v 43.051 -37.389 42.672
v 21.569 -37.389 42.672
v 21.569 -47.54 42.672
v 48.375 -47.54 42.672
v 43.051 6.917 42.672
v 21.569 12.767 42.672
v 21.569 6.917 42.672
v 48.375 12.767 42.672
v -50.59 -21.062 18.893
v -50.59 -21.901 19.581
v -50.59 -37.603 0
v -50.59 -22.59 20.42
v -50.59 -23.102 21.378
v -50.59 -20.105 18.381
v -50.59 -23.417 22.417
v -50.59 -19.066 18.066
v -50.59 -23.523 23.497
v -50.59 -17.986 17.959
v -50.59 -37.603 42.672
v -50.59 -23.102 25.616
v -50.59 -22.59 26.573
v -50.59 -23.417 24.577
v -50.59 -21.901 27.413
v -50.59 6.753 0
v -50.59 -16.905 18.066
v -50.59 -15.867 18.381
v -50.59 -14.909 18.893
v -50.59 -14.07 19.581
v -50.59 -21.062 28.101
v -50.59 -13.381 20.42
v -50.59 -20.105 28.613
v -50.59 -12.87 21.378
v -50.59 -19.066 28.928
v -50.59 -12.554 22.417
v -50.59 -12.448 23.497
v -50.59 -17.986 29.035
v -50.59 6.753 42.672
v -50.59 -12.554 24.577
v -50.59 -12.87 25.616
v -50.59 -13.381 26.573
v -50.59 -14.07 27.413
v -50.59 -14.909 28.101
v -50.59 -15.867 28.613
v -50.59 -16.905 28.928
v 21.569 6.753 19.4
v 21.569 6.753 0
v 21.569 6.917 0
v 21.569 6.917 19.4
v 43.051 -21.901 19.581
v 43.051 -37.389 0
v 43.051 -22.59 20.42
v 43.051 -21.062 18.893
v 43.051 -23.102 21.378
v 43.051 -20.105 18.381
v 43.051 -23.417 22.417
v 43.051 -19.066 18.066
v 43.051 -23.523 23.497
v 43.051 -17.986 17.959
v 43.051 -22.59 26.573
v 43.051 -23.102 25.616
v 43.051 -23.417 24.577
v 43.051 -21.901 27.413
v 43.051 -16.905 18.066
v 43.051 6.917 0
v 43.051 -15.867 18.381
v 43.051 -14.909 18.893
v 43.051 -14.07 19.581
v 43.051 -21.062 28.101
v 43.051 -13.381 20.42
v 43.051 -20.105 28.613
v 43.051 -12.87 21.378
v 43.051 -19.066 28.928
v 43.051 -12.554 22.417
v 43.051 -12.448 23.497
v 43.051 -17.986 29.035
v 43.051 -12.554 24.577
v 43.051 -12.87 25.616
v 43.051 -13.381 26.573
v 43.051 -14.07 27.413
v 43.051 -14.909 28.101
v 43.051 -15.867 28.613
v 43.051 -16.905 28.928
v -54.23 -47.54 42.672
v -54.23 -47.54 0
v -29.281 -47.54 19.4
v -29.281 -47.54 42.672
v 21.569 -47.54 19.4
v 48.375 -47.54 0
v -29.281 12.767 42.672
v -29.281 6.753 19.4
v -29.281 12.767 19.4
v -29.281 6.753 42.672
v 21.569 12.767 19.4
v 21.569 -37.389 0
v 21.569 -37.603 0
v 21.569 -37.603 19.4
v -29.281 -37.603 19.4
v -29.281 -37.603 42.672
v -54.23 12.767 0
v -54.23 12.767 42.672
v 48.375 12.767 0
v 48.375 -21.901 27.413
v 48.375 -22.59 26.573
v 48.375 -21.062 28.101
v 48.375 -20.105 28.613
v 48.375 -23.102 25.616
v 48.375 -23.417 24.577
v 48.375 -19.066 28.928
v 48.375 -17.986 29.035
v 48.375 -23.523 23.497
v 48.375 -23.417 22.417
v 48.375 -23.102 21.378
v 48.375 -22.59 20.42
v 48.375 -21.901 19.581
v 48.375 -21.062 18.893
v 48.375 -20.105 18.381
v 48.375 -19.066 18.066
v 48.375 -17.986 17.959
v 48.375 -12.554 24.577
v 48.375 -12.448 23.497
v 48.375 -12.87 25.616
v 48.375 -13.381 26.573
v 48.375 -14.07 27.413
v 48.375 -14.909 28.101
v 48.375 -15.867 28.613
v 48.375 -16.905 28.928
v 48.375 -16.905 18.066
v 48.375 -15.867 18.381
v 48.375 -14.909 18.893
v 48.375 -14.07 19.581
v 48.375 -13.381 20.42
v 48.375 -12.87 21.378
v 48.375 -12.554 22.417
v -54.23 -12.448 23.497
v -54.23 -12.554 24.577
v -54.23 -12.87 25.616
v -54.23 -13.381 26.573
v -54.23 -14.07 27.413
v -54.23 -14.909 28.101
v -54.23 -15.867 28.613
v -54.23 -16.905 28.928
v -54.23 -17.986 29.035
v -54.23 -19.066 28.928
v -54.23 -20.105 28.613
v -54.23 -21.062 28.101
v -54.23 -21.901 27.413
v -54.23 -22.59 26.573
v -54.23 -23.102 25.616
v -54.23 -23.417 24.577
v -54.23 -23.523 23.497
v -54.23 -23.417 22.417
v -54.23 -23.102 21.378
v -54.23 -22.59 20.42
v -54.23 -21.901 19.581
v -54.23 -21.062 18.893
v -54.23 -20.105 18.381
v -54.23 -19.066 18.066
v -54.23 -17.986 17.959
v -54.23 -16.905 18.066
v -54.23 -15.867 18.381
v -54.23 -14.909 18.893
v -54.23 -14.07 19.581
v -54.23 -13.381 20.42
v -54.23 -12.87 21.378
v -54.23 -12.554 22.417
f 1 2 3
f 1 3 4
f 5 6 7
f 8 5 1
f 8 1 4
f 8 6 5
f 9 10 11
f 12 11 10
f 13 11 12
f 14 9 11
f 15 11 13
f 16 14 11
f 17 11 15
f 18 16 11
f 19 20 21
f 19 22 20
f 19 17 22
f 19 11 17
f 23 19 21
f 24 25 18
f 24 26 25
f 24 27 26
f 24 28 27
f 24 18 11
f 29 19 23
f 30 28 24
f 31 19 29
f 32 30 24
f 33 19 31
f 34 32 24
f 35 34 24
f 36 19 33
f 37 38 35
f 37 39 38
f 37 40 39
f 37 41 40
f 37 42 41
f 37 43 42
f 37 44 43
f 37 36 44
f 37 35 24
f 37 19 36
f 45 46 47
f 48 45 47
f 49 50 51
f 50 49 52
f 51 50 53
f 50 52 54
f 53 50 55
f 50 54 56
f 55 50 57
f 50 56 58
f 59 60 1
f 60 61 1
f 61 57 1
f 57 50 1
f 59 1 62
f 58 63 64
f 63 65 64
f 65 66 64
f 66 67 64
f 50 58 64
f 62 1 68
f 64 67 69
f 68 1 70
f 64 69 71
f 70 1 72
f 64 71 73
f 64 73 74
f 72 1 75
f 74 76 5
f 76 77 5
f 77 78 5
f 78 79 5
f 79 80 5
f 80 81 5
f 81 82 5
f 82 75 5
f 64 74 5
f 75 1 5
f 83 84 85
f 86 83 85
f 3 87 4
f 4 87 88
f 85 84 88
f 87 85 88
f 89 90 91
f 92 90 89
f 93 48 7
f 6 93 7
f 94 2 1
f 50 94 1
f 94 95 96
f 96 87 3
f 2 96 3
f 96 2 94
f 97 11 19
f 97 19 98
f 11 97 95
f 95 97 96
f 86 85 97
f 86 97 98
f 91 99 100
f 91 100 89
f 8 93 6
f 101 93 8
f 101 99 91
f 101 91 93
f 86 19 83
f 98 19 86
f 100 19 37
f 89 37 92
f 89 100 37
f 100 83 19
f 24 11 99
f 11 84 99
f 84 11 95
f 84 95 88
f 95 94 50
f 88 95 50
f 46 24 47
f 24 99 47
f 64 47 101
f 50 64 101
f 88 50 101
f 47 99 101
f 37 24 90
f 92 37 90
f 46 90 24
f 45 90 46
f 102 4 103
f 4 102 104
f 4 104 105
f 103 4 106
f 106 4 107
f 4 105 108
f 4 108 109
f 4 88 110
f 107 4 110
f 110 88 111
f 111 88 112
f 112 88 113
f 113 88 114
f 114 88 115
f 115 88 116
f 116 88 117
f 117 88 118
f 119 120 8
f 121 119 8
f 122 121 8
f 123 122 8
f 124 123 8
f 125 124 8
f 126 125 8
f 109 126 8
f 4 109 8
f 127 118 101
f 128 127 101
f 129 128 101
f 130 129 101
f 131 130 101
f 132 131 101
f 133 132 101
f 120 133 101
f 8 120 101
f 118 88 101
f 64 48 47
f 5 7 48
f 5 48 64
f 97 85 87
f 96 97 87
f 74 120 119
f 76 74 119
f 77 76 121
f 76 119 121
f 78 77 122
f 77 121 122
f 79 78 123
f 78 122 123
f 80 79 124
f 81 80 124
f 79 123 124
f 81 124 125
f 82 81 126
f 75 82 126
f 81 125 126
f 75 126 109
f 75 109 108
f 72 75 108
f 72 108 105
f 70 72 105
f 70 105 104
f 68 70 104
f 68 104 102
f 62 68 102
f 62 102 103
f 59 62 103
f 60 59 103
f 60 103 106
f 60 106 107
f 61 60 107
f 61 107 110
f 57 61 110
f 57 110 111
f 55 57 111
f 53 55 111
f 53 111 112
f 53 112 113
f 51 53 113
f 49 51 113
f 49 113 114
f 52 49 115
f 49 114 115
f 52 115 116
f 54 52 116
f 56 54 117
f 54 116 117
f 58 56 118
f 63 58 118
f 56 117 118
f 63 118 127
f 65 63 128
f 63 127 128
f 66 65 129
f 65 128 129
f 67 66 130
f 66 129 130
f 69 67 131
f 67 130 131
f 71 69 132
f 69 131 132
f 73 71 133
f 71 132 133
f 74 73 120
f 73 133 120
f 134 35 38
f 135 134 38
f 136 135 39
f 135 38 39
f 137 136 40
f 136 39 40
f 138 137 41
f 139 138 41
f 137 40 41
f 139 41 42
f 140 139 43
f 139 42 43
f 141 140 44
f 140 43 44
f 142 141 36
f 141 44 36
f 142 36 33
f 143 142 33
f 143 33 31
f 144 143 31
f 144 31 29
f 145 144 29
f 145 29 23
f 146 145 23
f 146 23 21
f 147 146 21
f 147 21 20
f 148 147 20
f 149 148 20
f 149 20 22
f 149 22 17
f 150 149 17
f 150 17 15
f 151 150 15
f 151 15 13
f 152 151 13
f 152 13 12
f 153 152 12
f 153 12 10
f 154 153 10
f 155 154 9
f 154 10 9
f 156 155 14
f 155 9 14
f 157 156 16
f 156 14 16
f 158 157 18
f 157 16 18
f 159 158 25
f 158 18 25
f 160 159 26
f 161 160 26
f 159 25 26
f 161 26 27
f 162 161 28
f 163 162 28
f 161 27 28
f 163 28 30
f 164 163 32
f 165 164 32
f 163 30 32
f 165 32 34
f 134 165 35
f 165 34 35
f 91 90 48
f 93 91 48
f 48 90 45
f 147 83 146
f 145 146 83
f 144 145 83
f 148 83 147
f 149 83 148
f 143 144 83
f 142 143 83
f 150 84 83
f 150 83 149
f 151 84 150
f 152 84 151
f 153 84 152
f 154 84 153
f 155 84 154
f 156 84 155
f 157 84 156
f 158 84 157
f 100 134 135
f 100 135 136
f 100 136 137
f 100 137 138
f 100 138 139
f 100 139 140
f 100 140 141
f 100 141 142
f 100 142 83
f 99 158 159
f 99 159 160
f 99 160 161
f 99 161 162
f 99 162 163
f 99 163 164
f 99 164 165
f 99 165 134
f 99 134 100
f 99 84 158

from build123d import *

# Parameters (mm, degrees)
F0_W      = 102.6049330831
F0_H      = 60.307007283
F1_DEPTH  = 42.672
F2_W      = 50.8497301489
F2_H      = 23.2719845266
F3_DEPTH  = 108.712
F4_W      = 21.308818832
F4_H      = 44.3562362343
F5_DEPTH  = 70.612
F6_W      = 50.8497301489
F6_H      = 44.3562362343
F7_DEPTH  = 37.592
F8_W      = 21.4821361005
F8_H      = 44.3062051199
F9_DEPTH  = 71.882
F10_R     = 5.5376210479
F11_DEPTH = 182.626


with BuildPart() as f1:
    # F0 (on Top) → F1 (new body)
    with BuildSketch(Plane.XY):
        with Locations((-2.9272511601, -17.3868890852)):
            Rectangle(F0_W, F0_H)
    extrude(amount=F1_DEPTH)

    # F2 (on face) → F3 (cut)
    with BuildSketch(Plane.XZ.offset(47.5403927267)):
        with Locations((-3.8559036329, 31.0360077367)):
            Rectangle(F2_W, F2_H)
    extrude(amount=-F3_DEPTH, mode=Mode.SUBTRACT)

    # F4 (on face) → F5 (cut)
    with BuildSketch(Plane.XY.offset(42.672)):
        with Locations((-39.9351781234, -15.4247684404)):
            Rectangle(F4_W, F4_H)
    extrude(amount=-F5_DEPTH, mode=Mode.SUBTRACT)

    # F6 (on face) → F7 (cut)
    with BuildSketch(Plane.XY.offset(19.4000154734)):
        with Locations((-3.8559036329, -15.4247684404)):
            Rectangle(F6_W, F6_H)
    extrude(amount=-F7_DEPTH, mode=Mode.SUBTRACT)

    # F8 (on face) → F9 (cut)
    with BuildSketch(Plane.XY.offset(42.672)):
        with Locations((32.3100294918, -15.2362354565)):
            Rectangle(F8_W, F8_H)
    extrude(amount=-F9_DEPTH, mode=Mode.SUBTRACT)

    # F10 (on face) → F11 (cut)
    with BuildSketch(Plane.YZ.offset(48.3752153814)):
        with Locations((-17.9856810719, 23.4969127923)):
            Circle(F10_R)
    extrude(amount=-F11_DEPTH, mode=Mode.SUBTRACT)


solid = f1.part
